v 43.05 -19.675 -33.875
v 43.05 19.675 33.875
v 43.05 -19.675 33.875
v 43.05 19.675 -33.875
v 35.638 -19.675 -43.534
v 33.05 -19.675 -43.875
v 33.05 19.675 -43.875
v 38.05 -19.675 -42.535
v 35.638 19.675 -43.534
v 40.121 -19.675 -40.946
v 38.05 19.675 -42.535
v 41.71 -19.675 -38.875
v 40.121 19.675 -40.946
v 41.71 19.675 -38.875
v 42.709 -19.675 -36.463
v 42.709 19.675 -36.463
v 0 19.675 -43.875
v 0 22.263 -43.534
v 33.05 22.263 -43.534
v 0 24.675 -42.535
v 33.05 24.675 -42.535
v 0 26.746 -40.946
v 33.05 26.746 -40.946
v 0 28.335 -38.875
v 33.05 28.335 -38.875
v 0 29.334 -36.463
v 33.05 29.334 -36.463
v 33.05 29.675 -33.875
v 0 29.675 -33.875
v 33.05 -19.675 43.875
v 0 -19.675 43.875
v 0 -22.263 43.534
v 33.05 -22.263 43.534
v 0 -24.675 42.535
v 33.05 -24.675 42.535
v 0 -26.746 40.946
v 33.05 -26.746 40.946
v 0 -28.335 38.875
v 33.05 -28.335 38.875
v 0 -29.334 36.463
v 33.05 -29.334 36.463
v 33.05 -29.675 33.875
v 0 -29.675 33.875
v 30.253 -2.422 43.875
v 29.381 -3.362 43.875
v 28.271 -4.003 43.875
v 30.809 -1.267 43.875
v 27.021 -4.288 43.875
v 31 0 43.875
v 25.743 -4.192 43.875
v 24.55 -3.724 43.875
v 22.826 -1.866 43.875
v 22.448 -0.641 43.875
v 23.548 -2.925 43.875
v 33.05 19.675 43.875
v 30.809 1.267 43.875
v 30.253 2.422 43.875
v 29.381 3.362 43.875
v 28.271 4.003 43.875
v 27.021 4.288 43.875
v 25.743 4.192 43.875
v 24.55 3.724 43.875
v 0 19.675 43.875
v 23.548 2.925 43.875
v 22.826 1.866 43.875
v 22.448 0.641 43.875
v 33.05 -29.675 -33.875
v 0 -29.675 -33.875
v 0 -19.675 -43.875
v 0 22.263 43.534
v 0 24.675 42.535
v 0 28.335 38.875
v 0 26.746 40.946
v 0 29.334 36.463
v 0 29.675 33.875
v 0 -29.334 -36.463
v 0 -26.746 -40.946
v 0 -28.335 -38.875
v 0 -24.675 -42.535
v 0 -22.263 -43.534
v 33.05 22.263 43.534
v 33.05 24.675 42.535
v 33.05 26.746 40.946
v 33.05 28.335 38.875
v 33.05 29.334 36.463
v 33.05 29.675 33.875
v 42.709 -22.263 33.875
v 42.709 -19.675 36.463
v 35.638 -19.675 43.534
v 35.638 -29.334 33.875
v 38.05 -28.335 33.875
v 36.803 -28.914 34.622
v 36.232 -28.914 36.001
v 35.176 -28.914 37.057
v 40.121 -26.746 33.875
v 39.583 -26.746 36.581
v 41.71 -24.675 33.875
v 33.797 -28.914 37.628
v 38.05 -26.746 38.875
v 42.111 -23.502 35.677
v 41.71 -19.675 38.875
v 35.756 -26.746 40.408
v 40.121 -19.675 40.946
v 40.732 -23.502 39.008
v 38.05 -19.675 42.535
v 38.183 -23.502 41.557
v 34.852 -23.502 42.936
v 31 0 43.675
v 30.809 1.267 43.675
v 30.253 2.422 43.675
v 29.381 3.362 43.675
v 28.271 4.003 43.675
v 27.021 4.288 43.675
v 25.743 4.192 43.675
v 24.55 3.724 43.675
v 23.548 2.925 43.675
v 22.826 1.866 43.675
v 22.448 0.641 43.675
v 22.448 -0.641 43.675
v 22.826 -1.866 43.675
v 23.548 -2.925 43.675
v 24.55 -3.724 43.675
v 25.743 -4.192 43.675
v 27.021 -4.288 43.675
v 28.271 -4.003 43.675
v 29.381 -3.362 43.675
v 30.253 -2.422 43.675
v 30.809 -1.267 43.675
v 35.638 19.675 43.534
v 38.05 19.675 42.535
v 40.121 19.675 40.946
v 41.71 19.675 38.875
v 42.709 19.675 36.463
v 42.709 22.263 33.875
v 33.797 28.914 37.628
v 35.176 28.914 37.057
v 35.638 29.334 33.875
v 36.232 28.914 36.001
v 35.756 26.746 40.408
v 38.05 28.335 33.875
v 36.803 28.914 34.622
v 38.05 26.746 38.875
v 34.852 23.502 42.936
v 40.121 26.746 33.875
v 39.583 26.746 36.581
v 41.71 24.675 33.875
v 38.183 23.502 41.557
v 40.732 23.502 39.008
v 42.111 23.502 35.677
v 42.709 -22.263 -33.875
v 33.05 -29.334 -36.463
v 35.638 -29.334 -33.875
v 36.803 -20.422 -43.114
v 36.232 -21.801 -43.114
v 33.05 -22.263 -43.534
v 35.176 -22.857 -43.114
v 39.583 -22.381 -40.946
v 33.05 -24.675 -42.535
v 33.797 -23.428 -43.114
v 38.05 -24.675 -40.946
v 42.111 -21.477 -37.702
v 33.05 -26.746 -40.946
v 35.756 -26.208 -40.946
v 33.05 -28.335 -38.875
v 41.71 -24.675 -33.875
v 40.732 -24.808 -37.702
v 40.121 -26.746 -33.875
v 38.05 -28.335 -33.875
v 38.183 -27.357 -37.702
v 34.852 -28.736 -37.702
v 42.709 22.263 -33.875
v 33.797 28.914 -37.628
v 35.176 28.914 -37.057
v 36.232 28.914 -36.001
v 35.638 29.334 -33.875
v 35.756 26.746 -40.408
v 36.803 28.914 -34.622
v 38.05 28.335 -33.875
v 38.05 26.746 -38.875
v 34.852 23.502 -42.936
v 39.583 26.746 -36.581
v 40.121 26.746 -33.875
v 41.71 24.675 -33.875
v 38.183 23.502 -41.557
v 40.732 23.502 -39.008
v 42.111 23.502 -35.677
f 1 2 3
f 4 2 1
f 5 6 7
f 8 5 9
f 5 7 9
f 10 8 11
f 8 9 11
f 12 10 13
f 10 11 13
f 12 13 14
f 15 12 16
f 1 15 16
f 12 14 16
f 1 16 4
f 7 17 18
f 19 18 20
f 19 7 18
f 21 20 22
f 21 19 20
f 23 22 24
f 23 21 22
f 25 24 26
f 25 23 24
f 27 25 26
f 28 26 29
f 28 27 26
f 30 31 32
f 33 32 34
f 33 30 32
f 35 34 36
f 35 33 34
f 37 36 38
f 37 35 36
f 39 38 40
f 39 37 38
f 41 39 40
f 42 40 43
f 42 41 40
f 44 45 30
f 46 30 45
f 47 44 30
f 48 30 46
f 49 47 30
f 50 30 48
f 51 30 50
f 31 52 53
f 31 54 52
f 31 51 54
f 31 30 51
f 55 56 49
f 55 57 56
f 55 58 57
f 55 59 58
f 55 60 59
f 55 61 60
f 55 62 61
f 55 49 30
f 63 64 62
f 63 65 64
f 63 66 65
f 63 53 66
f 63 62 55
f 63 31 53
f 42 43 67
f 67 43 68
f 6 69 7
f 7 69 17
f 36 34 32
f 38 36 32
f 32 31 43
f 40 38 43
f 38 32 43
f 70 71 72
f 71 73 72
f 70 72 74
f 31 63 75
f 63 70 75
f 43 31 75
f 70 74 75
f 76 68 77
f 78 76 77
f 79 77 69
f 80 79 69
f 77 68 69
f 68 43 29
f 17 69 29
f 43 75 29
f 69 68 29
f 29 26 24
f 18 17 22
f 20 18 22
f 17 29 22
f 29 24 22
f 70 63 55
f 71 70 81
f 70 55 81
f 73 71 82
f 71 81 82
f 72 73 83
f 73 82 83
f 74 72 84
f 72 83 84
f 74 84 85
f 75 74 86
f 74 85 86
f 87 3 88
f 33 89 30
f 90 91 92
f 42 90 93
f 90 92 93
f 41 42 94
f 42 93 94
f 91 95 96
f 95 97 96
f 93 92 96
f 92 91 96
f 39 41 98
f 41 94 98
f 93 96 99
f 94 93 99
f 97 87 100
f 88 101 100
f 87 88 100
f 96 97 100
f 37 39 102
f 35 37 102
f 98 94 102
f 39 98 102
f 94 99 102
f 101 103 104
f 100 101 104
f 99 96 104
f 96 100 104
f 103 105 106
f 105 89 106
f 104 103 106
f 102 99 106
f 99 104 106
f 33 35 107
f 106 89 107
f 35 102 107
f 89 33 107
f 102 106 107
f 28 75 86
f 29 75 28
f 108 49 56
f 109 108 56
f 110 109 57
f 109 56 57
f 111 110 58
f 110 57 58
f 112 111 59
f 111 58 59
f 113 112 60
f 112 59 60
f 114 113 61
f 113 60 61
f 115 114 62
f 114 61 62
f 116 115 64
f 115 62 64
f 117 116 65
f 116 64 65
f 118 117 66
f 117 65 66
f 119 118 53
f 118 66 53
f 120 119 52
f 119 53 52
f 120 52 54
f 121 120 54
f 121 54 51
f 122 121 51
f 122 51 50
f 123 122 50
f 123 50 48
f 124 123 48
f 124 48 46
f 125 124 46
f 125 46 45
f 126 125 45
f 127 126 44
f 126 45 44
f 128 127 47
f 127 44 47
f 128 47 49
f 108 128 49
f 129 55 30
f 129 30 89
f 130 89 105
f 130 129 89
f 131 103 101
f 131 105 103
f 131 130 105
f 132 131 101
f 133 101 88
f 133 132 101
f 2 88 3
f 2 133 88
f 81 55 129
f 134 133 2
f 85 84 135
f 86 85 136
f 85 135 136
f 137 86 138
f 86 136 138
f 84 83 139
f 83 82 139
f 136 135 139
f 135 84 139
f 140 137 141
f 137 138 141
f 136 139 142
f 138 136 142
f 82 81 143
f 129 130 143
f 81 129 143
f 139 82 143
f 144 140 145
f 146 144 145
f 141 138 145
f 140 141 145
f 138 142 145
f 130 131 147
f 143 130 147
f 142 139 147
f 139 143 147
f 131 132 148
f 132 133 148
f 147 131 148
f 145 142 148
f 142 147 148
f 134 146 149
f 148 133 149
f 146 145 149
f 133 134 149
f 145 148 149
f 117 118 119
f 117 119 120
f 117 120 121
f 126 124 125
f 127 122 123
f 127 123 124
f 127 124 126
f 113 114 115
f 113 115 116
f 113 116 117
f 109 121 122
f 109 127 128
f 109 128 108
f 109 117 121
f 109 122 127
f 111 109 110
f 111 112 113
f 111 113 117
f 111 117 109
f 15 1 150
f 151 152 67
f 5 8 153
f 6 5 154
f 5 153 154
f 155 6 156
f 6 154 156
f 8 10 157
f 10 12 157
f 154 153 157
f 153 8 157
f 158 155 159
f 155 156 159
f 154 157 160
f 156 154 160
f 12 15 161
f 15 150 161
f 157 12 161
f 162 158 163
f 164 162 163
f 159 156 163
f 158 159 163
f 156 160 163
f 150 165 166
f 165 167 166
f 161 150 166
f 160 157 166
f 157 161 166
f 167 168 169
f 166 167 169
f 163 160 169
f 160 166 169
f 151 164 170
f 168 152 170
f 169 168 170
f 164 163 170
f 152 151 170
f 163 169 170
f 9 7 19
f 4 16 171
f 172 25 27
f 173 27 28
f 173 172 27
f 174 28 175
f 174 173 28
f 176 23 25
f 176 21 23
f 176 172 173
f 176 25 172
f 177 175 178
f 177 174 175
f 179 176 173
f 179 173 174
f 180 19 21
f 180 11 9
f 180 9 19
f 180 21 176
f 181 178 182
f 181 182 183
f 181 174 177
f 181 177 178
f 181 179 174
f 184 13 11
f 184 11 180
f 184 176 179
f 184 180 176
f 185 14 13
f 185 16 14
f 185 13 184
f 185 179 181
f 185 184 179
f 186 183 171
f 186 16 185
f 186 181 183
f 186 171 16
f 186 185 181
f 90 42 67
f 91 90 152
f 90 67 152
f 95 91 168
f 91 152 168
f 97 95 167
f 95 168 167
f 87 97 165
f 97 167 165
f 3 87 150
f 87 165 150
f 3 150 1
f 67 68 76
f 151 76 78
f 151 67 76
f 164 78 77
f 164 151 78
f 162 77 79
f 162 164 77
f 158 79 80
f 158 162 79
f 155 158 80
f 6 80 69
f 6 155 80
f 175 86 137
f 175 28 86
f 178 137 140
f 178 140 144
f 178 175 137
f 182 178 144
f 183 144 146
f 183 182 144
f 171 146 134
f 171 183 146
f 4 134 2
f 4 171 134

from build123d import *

# Parameters (mm, degrees)
SKETCH1_W           = 87.75
SKETCH1_H           = 59.35
BOSS_EXTRUDE1_DEPTH = 43.05
FILLET1_R           = 10
SKETCH2_R           = 4.3
CUT_EXTRUDE1_DEPTH  = 0.2


with BuildPart() as part:
    # Sketch1 → Boss-Extrude1 (new body)
    with BuildSketch(Plane(origin=(0, 0, 0), x_dir=(0, 0, -1), z_dir=(1, 0, 0))):
        Rectangle(SKETCH1_W, SKETCH1_H)
    extrude(amount=BOSS_EXTRUDE1_DEPTH)

    # Fillet1
    fillet1_edges = [part.edges().sort_by_distance(p)[0] for p in [
        (43.05, 0, 43.875),
        (43.05, -29.675, 0),
        (43.05, 0, -43.875),
        (21.525, -29.675, -43.875),
        (21.525, -29.675, 43.875),
        (21.525, 29.675, 43.875),
        (21.525, 29.675, -43.875),
        (43.05, 29.675, 0),
    ]]
    fillet(fillet1_edges, radius=FILLET1_R)

    # Sketch2 → Cut-Extrude1 (cut)
    with BuildSketch(Plane.XY.offset(43.875)):
        with Locations((26.7, 0)):
            Circle(SKETCH2_R)
    extrude(amount=-CUT_EXTRUDE1_DEPTH, mode=Mode.SUBTRACT)


solid = part.part
